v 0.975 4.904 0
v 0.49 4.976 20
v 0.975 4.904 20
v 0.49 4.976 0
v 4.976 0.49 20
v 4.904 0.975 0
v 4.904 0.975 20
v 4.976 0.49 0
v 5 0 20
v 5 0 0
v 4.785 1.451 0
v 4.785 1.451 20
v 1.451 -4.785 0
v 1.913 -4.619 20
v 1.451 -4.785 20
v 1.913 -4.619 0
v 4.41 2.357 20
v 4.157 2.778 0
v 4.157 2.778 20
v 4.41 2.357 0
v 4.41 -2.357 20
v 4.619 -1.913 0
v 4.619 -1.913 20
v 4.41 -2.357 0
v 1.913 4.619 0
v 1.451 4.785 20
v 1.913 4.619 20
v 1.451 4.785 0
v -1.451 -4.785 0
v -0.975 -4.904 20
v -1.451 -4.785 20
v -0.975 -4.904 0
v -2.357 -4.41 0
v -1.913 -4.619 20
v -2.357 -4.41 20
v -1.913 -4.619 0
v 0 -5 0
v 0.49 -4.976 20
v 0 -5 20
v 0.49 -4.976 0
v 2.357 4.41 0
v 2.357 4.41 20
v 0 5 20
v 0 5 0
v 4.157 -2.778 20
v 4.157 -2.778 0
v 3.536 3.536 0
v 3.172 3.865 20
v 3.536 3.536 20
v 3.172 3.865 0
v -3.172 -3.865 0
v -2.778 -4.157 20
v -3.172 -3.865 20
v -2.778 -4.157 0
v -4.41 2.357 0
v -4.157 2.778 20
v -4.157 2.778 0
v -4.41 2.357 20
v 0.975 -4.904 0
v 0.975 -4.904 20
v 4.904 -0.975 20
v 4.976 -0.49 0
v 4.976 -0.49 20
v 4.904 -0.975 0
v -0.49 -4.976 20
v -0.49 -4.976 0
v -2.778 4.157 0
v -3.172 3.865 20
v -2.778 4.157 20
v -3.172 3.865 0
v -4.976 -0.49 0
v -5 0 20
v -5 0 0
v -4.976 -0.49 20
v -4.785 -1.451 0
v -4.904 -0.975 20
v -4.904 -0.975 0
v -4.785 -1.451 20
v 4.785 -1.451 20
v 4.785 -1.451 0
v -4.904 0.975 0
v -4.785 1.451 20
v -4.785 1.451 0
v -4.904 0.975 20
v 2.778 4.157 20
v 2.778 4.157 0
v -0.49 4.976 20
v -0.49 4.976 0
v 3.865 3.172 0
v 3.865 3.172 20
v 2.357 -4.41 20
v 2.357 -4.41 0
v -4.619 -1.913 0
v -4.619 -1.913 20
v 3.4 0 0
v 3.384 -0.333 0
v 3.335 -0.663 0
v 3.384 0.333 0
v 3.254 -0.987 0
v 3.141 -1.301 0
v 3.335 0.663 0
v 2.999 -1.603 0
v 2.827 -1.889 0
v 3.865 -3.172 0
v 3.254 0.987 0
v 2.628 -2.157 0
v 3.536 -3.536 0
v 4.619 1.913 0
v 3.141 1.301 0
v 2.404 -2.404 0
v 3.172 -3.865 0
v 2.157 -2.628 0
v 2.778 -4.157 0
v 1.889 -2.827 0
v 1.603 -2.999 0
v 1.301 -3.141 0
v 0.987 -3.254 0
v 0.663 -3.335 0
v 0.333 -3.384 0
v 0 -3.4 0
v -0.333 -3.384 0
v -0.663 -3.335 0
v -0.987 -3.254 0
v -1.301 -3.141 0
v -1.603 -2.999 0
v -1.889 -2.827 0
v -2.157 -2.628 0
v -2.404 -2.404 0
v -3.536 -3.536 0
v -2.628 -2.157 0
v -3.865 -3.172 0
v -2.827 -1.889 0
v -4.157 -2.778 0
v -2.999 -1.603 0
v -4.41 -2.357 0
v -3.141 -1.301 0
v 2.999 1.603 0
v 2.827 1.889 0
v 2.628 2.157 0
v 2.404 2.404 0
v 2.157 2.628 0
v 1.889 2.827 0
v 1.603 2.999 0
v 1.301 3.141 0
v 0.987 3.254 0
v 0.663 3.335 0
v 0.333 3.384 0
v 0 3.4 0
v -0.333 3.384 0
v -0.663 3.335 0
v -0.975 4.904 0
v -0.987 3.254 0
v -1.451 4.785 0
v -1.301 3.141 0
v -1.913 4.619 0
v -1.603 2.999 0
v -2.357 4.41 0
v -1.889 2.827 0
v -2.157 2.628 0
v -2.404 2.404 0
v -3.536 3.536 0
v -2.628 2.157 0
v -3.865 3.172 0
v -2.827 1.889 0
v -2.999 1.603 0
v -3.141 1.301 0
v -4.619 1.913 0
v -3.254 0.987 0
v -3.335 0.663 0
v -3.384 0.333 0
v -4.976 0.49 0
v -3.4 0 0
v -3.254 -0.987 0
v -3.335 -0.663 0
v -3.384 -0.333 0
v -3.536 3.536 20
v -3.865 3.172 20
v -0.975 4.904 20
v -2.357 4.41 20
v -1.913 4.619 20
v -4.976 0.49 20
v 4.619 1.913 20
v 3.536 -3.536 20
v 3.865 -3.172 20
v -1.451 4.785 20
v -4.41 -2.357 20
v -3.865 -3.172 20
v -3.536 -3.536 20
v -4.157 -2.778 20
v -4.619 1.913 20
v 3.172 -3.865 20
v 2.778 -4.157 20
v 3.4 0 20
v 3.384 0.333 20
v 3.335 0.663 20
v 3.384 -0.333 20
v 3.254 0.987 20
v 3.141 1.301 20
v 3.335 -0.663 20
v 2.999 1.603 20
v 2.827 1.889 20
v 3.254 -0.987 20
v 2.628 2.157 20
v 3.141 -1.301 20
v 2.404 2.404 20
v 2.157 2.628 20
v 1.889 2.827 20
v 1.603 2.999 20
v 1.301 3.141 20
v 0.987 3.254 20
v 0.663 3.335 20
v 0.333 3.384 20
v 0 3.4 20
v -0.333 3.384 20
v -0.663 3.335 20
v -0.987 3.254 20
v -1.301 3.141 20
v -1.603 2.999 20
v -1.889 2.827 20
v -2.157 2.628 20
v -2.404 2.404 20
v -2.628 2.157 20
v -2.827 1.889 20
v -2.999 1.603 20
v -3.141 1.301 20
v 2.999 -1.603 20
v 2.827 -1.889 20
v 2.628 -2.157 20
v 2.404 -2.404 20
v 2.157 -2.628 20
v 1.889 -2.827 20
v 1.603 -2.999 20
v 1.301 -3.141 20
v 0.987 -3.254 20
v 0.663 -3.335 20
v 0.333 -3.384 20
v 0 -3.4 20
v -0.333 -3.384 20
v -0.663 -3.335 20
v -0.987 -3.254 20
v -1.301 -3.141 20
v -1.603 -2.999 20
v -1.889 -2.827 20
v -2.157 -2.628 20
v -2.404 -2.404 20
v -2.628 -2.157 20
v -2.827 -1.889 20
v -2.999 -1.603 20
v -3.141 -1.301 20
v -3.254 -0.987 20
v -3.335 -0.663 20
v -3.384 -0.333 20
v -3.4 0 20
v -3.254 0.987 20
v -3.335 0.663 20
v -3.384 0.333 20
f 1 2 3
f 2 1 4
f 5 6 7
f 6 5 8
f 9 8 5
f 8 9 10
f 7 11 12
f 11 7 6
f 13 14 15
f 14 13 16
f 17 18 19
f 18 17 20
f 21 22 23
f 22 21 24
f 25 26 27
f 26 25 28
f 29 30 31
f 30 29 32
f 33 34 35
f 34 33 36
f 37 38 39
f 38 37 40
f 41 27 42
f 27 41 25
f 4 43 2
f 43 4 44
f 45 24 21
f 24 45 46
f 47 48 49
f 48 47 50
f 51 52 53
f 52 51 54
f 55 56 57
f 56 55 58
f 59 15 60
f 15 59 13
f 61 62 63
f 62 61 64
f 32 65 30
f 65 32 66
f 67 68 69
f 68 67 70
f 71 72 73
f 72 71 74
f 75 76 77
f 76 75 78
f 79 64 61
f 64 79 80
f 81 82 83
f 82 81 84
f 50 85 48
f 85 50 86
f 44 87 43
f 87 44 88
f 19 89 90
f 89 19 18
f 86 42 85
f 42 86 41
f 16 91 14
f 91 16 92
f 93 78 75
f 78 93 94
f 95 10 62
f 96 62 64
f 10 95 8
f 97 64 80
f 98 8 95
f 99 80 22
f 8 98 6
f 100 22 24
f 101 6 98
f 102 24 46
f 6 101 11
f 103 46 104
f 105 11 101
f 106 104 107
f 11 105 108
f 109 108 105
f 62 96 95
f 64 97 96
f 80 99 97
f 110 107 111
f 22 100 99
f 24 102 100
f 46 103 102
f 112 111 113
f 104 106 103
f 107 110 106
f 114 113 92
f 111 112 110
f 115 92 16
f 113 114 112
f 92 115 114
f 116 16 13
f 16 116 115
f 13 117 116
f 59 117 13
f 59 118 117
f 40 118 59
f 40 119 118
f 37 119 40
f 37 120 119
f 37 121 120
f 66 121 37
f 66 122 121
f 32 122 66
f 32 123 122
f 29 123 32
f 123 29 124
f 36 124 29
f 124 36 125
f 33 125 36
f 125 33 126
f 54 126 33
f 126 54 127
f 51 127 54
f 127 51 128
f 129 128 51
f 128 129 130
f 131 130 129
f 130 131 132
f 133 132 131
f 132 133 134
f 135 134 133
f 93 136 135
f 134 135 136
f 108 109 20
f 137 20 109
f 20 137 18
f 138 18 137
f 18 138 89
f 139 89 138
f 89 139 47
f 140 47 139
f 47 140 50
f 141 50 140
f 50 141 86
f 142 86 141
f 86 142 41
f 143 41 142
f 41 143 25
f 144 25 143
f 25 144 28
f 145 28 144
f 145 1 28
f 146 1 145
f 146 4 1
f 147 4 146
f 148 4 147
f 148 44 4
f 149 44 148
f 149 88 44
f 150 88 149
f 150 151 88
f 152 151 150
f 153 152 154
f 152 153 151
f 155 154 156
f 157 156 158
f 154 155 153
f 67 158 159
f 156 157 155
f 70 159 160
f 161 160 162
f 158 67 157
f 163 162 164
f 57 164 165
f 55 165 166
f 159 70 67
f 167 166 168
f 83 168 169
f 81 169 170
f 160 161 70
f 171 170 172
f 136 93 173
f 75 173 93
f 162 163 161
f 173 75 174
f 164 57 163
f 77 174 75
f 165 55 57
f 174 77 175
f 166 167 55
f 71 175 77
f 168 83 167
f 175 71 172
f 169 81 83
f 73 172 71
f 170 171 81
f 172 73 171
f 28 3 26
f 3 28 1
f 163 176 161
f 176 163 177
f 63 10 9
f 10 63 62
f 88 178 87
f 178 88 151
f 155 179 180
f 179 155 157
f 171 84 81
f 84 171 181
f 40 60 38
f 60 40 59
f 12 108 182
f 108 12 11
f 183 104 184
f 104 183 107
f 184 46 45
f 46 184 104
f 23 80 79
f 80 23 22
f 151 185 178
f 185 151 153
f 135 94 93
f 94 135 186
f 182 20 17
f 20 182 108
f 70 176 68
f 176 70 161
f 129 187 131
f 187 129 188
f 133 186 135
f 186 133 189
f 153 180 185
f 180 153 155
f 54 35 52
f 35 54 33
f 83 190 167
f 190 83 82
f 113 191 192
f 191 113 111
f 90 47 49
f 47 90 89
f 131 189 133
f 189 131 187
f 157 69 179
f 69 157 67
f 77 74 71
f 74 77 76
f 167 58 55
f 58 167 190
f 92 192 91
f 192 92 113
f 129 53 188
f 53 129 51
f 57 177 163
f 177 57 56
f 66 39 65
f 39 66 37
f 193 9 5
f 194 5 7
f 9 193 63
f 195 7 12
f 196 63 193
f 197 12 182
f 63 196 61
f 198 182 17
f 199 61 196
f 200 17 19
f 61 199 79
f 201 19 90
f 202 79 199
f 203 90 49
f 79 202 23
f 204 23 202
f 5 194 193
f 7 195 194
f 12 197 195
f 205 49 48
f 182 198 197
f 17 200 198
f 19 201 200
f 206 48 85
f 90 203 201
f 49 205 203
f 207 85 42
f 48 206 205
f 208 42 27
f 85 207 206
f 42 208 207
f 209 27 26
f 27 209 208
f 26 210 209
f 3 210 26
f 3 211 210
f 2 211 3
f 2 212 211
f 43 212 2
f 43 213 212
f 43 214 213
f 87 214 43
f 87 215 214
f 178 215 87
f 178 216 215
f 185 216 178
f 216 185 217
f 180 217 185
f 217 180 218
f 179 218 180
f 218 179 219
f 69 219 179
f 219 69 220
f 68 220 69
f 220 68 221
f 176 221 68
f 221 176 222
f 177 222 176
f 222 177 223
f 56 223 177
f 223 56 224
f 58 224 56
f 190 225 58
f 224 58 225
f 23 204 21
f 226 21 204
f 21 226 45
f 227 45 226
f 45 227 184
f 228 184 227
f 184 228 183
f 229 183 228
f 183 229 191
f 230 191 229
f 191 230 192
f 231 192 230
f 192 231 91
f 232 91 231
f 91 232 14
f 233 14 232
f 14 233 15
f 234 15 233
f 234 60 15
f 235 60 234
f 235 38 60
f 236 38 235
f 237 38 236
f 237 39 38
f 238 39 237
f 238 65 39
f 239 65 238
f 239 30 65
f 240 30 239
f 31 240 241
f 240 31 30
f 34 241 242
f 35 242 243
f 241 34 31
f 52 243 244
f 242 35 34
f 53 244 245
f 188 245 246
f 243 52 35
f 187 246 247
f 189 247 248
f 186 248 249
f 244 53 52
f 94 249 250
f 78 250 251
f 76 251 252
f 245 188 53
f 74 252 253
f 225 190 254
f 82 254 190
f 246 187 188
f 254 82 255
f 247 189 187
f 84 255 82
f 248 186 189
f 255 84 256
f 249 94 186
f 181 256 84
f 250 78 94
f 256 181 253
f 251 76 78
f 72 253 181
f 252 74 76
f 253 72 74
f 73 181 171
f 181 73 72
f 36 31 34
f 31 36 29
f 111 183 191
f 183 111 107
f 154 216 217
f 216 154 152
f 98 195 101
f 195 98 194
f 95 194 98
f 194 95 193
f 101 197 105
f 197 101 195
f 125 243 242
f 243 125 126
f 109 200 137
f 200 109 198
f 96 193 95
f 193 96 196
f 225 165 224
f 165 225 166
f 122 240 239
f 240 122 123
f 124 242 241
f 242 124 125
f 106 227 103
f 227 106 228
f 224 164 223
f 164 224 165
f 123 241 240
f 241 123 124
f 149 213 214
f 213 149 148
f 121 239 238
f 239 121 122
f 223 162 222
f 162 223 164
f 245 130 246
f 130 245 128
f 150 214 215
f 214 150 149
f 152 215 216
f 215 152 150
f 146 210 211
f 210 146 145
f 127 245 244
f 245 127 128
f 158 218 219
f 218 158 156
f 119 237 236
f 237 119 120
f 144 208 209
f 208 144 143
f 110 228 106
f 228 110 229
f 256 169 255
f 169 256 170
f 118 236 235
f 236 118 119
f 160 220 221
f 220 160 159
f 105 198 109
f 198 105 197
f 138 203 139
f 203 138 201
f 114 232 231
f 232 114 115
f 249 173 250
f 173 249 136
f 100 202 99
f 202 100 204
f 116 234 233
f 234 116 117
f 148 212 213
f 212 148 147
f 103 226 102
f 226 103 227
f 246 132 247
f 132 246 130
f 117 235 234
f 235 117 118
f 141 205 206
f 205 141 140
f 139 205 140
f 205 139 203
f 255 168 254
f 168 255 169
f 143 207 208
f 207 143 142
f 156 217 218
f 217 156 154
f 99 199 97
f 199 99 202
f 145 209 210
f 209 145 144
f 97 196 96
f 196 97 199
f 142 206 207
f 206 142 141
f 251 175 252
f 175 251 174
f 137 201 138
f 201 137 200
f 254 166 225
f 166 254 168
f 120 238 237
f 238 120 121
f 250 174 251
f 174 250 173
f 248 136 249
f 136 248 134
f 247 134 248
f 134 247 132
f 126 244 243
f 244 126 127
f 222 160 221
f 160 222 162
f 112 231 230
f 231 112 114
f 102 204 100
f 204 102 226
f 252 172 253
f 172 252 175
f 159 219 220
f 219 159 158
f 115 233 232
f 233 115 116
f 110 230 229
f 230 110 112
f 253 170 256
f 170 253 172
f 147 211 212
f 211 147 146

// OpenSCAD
// Funnel - printed upright, wide opening at top, open bottom and spout through
// Units: mm. Teaches a cone + spout with uniform wall thickness.
//

spout_d     = 10;   // spout outer diameter
spout_bore  = 6.8;  // spout bore (10 - 2*1.6)
spout_h     = 20;   // spout height (z = 0 to 20)
cone_top_d  = 60;   // cone rim outer diameter (z = 50)
cone_h      = 30;   // cone height (z = 20 to 50)
wall        = 1.6;  // wall thickness everywhere
eps         = 0.5;  // cutter overshoot

$fn = 64;

// Cone inner diameter at its start (z = 20), bore open through
cone_in_d = spout_d - 2*wall;   // 6.8 mm, matches bore

difference() {
    union() {
        // Spout: cylinder z = 0..20
        cylinder(d = spout_d, h = spout_h);
        // Cone: linear_extrude from a 6.8 mm disk at z = 20 up to 60 mm at z = 50
        translate([0, 0, spout_h])
            linear_extrude(height = cone_h)
                cylinder(d = cone_in_d, h = cone_h + 0.01); // tiny overlap for clean union
    }
    // Through-bore: one cylinder from z = 0 to z = 50.01
    translate([0, 0, -eps])
        cylinder(d = spout_bore, h = spout_h + cone_h + 2*eps);
}
